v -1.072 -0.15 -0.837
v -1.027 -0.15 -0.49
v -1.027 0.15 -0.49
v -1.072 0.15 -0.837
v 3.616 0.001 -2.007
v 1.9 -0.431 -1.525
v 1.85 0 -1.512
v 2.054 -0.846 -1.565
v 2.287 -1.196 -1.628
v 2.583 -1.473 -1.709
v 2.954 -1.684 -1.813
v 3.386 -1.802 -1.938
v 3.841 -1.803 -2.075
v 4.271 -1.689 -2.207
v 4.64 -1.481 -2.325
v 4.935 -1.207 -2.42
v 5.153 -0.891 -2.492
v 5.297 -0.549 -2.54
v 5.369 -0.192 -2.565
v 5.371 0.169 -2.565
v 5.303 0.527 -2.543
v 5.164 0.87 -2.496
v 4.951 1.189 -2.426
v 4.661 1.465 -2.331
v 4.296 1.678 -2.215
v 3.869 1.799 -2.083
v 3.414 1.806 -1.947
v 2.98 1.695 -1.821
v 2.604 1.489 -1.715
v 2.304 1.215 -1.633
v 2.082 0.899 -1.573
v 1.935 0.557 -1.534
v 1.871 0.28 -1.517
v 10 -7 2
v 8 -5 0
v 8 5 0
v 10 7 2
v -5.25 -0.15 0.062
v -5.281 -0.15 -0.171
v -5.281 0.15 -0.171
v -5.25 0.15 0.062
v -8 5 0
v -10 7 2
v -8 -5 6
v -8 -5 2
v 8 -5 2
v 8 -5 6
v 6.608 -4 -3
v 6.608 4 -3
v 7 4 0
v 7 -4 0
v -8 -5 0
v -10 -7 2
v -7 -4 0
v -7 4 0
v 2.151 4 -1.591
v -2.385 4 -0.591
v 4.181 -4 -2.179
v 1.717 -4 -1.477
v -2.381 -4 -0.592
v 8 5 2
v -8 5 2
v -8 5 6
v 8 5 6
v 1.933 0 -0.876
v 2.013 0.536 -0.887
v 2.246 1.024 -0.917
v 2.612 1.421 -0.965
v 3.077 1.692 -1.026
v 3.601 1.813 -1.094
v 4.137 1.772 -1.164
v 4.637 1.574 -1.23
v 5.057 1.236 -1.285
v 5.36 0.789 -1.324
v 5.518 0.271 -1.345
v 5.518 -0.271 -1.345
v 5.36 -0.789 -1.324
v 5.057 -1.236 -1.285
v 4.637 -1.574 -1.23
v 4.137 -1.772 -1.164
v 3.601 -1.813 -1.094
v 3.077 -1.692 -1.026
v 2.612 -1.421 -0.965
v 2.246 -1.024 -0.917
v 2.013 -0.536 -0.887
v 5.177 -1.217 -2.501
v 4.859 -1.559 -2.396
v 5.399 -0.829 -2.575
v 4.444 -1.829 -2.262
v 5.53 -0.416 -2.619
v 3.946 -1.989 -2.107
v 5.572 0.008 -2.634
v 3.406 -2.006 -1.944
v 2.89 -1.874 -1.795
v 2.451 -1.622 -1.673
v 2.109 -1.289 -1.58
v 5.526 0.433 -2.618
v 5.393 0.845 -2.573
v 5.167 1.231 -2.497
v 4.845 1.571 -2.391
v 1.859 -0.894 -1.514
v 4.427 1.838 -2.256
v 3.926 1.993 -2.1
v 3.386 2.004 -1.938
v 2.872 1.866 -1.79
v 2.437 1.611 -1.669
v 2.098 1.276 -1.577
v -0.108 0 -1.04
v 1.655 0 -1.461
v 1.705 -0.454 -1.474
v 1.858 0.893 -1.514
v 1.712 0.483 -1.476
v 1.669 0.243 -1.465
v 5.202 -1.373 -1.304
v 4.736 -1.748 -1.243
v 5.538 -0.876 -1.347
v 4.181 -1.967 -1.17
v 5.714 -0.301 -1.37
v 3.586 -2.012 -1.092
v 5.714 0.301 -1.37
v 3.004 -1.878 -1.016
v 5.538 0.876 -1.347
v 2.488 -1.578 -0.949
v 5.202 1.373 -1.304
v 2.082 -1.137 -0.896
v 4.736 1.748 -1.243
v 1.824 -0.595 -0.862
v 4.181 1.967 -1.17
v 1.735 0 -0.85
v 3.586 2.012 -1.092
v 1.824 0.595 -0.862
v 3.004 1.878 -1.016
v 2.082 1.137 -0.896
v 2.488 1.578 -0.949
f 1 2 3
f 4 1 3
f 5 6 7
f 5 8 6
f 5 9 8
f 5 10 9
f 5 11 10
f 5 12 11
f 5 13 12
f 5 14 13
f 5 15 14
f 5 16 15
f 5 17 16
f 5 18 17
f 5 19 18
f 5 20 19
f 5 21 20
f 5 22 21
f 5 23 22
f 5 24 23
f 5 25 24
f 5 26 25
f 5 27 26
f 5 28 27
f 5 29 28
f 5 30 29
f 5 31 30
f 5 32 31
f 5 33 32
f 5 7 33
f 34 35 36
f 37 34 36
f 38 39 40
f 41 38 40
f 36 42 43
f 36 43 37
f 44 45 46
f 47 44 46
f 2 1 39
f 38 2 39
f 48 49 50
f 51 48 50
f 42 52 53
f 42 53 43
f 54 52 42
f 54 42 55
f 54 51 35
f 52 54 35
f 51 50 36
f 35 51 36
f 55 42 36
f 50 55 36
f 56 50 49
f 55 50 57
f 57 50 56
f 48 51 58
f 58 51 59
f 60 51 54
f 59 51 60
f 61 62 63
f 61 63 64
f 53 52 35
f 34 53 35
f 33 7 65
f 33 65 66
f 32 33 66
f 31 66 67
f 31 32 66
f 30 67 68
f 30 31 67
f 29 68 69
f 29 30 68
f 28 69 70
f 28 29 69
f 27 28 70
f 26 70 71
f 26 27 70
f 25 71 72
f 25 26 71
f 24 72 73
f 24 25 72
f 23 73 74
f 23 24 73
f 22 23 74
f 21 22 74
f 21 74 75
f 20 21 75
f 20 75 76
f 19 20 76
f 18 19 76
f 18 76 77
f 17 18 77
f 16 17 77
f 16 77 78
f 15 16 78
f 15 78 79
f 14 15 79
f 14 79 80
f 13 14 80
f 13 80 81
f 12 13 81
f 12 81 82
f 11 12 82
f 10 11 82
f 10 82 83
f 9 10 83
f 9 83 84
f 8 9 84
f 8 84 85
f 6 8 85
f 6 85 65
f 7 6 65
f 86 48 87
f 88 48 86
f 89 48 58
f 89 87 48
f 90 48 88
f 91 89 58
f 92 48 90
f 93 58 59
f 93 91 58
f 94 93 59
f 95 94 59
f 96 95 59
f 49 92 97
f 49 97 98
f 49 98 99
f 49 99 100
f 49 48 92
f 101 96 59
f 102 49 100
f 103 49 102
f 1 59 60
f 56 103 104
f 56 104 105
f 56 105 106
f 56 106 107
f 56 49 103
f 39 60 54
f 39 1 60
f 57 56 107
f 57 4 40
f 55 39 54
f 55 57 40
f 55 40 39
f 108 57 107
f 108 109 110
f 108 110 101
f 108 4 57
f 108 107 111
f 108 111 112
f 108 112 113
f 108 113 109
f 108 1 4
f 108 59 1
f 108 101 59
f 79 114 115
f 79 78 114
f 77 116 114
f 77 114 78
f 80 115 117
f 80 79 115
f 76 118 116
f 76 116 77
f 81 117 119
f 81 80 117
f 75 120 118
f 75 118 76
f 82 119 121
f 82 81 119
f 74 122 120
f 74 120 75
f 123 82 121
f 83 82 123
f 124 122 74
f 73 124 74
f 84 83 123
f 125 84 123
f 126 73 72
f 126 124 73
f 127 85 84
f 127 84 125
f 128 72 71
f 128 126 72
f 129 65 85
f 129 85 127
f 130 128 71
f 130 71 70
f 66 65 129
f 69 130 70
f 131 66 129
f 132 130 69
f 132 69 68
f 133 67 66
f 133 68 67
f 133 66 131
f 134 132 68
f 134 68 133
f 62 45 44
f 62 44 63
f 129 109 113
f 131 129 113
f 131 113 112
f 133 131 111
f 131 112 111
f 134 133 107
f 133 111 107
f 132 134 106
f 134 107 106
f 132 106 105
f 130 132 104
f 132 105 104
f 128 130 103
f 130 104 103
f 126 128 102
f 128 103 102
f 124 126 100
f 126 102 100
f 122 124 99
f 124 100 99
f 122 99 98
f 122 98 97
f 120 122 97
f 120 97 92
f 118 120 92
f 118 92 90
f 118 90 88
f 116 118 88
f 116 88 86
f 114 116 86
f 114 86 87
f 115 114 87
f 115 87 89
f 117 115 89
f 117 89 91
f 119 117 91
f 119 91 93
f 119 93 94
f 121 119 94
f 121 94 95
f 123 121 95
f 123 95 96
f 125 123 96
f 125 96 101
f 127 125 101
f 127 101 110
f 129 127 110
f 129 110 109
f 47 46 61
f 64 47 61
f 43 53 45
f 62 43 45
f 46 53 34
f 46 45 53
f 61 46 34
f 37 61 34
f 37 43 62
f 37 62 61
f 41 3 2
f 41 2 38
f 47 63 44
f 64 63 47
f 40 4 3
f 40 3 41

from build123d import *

# Parameters (mm, degrees)
SKETCH1_W           = 20
SKETCH1_H           = 14
BOSS_EXTRUDE1_DEPTH = 2
CHAMFER3_SIZE       = 2
SKETCH2_W           = 14
SKETCH2_H           = 8
BOSS_EXTRUDE2_DEPTH = 3
CUT_EXTRUDE1_DEPTH  = 16.165750888
SKETCH5_W           = 16
SKETCH5_H           = 10
BOSS_EXTRUDE3_DEPTH = 4
SKETCH6_R           = 2.017871448
SKETCH6_R_2         = 1.817871448
SKETCH6_W           = 4.259238865
SKETCH6_H           = 0.3
CUT_EXTRUDE2_DEPTH  = 1.5


with BuildPart() as part:
    # Sketch1 → Boss-Extrude1 (new body)
    with BuildSketch(Plane.XY):
        Rectangle(SKETCH1_W, SKETCH1_H)
    extrude(amount=BOSS_EXTRUDE1_DEPTH)

    # Chamfer3
    chamfer3_edges = [part.edges().sort_by_distance(p)[0] for p in [
        (-10, 0, 0),
        (0, -7, 0),
        (0, 7, 0),
        (10, 0, 0),
    ]]
    chamfer(chamfer3_edges, length=CHAMFER3_SIZE - 0.0001)  # a hair under: the kernel refuses the full size

    # Sketch2 → Boss-Extrude2 (add)
    with BuildSketch(Plane(origin=(0, 0, 0), x_dir=(-1, 0, 0), z_dir=(0, 0, -1))):
        Rectangle(SKETCH2_W, SKETCH2_H)
    extrude(amount=BOSS_EXTRUDE2_DEPTH)

    # Sketch3 → Cut-Extrude1 (cut, through all)
    with BuildSketch(Plane(origin=(0, 4, 0), x_dir=(1, 0, 0), z_dir=(0, 1, 0))):
        with BuildLine():
            add(Edge.make_bspline(
                [(6.607979195, 3), (-0.019315958, 0.580486074), (-7, 0)],
                knots=[0, 0, 0, 1, 1, 1], degree=2))
            Line((6.607979195, 3), (-7, 3))
            Line((-7, 3), (-7, 0))
        make_face()
        Polygon((6.607979195, 3), (7, 0), (7, 3), align=None)
    extrude(amount=-CUT_EXTRUDE1_DEPTH, mode=Mode.SUBTRACT)

    # Sketch5 → Boss-Extrude3 (add)
    with BuildSketch(Plane.XY.offset(2)):
        Rectangle(SKETCH5_W, SKETCH5_H)
    extrude(amount=BOSS_EXTRUDE3_DEPTH)

    # Sketch6 → Cut-Extrude2 (cut)
    # profile 1 of 2: a face of its own
    with BuildSketch(Plane(origin=(6.607979195, -4, -3), x_dir=(-0.9915700128560622, 0, 0.12957202477629515), z_dir=(-0.12957202477629515, 0, -0.9915700128560622))):
        with Locations((3.092933481, 4)):
            Circle(SKETCH6_R)
        with Locations((3.092933481, 4)):
            Circle(SKETCH6_R_2, mode=Mode.SUBTRACT)
    # profile 2 of 2: a face of its own
    with BuildSketch(Plane(origin=(6.607979195, -4, -3), x_dir=(-0.9915700128560622, 0, 0.12957202477629515), z_dir=(-0.12957202477629515, 0, -0.9915700128560622))):
        with Locations((10.0255244, 4)):
            Rectangle(SKETCH6_W, SKETCH6_H)
    extrude(amount=-CUT_EXTRUDE2_DEPTH, mode=Mode.SUBTRACT)


solid = part.part
